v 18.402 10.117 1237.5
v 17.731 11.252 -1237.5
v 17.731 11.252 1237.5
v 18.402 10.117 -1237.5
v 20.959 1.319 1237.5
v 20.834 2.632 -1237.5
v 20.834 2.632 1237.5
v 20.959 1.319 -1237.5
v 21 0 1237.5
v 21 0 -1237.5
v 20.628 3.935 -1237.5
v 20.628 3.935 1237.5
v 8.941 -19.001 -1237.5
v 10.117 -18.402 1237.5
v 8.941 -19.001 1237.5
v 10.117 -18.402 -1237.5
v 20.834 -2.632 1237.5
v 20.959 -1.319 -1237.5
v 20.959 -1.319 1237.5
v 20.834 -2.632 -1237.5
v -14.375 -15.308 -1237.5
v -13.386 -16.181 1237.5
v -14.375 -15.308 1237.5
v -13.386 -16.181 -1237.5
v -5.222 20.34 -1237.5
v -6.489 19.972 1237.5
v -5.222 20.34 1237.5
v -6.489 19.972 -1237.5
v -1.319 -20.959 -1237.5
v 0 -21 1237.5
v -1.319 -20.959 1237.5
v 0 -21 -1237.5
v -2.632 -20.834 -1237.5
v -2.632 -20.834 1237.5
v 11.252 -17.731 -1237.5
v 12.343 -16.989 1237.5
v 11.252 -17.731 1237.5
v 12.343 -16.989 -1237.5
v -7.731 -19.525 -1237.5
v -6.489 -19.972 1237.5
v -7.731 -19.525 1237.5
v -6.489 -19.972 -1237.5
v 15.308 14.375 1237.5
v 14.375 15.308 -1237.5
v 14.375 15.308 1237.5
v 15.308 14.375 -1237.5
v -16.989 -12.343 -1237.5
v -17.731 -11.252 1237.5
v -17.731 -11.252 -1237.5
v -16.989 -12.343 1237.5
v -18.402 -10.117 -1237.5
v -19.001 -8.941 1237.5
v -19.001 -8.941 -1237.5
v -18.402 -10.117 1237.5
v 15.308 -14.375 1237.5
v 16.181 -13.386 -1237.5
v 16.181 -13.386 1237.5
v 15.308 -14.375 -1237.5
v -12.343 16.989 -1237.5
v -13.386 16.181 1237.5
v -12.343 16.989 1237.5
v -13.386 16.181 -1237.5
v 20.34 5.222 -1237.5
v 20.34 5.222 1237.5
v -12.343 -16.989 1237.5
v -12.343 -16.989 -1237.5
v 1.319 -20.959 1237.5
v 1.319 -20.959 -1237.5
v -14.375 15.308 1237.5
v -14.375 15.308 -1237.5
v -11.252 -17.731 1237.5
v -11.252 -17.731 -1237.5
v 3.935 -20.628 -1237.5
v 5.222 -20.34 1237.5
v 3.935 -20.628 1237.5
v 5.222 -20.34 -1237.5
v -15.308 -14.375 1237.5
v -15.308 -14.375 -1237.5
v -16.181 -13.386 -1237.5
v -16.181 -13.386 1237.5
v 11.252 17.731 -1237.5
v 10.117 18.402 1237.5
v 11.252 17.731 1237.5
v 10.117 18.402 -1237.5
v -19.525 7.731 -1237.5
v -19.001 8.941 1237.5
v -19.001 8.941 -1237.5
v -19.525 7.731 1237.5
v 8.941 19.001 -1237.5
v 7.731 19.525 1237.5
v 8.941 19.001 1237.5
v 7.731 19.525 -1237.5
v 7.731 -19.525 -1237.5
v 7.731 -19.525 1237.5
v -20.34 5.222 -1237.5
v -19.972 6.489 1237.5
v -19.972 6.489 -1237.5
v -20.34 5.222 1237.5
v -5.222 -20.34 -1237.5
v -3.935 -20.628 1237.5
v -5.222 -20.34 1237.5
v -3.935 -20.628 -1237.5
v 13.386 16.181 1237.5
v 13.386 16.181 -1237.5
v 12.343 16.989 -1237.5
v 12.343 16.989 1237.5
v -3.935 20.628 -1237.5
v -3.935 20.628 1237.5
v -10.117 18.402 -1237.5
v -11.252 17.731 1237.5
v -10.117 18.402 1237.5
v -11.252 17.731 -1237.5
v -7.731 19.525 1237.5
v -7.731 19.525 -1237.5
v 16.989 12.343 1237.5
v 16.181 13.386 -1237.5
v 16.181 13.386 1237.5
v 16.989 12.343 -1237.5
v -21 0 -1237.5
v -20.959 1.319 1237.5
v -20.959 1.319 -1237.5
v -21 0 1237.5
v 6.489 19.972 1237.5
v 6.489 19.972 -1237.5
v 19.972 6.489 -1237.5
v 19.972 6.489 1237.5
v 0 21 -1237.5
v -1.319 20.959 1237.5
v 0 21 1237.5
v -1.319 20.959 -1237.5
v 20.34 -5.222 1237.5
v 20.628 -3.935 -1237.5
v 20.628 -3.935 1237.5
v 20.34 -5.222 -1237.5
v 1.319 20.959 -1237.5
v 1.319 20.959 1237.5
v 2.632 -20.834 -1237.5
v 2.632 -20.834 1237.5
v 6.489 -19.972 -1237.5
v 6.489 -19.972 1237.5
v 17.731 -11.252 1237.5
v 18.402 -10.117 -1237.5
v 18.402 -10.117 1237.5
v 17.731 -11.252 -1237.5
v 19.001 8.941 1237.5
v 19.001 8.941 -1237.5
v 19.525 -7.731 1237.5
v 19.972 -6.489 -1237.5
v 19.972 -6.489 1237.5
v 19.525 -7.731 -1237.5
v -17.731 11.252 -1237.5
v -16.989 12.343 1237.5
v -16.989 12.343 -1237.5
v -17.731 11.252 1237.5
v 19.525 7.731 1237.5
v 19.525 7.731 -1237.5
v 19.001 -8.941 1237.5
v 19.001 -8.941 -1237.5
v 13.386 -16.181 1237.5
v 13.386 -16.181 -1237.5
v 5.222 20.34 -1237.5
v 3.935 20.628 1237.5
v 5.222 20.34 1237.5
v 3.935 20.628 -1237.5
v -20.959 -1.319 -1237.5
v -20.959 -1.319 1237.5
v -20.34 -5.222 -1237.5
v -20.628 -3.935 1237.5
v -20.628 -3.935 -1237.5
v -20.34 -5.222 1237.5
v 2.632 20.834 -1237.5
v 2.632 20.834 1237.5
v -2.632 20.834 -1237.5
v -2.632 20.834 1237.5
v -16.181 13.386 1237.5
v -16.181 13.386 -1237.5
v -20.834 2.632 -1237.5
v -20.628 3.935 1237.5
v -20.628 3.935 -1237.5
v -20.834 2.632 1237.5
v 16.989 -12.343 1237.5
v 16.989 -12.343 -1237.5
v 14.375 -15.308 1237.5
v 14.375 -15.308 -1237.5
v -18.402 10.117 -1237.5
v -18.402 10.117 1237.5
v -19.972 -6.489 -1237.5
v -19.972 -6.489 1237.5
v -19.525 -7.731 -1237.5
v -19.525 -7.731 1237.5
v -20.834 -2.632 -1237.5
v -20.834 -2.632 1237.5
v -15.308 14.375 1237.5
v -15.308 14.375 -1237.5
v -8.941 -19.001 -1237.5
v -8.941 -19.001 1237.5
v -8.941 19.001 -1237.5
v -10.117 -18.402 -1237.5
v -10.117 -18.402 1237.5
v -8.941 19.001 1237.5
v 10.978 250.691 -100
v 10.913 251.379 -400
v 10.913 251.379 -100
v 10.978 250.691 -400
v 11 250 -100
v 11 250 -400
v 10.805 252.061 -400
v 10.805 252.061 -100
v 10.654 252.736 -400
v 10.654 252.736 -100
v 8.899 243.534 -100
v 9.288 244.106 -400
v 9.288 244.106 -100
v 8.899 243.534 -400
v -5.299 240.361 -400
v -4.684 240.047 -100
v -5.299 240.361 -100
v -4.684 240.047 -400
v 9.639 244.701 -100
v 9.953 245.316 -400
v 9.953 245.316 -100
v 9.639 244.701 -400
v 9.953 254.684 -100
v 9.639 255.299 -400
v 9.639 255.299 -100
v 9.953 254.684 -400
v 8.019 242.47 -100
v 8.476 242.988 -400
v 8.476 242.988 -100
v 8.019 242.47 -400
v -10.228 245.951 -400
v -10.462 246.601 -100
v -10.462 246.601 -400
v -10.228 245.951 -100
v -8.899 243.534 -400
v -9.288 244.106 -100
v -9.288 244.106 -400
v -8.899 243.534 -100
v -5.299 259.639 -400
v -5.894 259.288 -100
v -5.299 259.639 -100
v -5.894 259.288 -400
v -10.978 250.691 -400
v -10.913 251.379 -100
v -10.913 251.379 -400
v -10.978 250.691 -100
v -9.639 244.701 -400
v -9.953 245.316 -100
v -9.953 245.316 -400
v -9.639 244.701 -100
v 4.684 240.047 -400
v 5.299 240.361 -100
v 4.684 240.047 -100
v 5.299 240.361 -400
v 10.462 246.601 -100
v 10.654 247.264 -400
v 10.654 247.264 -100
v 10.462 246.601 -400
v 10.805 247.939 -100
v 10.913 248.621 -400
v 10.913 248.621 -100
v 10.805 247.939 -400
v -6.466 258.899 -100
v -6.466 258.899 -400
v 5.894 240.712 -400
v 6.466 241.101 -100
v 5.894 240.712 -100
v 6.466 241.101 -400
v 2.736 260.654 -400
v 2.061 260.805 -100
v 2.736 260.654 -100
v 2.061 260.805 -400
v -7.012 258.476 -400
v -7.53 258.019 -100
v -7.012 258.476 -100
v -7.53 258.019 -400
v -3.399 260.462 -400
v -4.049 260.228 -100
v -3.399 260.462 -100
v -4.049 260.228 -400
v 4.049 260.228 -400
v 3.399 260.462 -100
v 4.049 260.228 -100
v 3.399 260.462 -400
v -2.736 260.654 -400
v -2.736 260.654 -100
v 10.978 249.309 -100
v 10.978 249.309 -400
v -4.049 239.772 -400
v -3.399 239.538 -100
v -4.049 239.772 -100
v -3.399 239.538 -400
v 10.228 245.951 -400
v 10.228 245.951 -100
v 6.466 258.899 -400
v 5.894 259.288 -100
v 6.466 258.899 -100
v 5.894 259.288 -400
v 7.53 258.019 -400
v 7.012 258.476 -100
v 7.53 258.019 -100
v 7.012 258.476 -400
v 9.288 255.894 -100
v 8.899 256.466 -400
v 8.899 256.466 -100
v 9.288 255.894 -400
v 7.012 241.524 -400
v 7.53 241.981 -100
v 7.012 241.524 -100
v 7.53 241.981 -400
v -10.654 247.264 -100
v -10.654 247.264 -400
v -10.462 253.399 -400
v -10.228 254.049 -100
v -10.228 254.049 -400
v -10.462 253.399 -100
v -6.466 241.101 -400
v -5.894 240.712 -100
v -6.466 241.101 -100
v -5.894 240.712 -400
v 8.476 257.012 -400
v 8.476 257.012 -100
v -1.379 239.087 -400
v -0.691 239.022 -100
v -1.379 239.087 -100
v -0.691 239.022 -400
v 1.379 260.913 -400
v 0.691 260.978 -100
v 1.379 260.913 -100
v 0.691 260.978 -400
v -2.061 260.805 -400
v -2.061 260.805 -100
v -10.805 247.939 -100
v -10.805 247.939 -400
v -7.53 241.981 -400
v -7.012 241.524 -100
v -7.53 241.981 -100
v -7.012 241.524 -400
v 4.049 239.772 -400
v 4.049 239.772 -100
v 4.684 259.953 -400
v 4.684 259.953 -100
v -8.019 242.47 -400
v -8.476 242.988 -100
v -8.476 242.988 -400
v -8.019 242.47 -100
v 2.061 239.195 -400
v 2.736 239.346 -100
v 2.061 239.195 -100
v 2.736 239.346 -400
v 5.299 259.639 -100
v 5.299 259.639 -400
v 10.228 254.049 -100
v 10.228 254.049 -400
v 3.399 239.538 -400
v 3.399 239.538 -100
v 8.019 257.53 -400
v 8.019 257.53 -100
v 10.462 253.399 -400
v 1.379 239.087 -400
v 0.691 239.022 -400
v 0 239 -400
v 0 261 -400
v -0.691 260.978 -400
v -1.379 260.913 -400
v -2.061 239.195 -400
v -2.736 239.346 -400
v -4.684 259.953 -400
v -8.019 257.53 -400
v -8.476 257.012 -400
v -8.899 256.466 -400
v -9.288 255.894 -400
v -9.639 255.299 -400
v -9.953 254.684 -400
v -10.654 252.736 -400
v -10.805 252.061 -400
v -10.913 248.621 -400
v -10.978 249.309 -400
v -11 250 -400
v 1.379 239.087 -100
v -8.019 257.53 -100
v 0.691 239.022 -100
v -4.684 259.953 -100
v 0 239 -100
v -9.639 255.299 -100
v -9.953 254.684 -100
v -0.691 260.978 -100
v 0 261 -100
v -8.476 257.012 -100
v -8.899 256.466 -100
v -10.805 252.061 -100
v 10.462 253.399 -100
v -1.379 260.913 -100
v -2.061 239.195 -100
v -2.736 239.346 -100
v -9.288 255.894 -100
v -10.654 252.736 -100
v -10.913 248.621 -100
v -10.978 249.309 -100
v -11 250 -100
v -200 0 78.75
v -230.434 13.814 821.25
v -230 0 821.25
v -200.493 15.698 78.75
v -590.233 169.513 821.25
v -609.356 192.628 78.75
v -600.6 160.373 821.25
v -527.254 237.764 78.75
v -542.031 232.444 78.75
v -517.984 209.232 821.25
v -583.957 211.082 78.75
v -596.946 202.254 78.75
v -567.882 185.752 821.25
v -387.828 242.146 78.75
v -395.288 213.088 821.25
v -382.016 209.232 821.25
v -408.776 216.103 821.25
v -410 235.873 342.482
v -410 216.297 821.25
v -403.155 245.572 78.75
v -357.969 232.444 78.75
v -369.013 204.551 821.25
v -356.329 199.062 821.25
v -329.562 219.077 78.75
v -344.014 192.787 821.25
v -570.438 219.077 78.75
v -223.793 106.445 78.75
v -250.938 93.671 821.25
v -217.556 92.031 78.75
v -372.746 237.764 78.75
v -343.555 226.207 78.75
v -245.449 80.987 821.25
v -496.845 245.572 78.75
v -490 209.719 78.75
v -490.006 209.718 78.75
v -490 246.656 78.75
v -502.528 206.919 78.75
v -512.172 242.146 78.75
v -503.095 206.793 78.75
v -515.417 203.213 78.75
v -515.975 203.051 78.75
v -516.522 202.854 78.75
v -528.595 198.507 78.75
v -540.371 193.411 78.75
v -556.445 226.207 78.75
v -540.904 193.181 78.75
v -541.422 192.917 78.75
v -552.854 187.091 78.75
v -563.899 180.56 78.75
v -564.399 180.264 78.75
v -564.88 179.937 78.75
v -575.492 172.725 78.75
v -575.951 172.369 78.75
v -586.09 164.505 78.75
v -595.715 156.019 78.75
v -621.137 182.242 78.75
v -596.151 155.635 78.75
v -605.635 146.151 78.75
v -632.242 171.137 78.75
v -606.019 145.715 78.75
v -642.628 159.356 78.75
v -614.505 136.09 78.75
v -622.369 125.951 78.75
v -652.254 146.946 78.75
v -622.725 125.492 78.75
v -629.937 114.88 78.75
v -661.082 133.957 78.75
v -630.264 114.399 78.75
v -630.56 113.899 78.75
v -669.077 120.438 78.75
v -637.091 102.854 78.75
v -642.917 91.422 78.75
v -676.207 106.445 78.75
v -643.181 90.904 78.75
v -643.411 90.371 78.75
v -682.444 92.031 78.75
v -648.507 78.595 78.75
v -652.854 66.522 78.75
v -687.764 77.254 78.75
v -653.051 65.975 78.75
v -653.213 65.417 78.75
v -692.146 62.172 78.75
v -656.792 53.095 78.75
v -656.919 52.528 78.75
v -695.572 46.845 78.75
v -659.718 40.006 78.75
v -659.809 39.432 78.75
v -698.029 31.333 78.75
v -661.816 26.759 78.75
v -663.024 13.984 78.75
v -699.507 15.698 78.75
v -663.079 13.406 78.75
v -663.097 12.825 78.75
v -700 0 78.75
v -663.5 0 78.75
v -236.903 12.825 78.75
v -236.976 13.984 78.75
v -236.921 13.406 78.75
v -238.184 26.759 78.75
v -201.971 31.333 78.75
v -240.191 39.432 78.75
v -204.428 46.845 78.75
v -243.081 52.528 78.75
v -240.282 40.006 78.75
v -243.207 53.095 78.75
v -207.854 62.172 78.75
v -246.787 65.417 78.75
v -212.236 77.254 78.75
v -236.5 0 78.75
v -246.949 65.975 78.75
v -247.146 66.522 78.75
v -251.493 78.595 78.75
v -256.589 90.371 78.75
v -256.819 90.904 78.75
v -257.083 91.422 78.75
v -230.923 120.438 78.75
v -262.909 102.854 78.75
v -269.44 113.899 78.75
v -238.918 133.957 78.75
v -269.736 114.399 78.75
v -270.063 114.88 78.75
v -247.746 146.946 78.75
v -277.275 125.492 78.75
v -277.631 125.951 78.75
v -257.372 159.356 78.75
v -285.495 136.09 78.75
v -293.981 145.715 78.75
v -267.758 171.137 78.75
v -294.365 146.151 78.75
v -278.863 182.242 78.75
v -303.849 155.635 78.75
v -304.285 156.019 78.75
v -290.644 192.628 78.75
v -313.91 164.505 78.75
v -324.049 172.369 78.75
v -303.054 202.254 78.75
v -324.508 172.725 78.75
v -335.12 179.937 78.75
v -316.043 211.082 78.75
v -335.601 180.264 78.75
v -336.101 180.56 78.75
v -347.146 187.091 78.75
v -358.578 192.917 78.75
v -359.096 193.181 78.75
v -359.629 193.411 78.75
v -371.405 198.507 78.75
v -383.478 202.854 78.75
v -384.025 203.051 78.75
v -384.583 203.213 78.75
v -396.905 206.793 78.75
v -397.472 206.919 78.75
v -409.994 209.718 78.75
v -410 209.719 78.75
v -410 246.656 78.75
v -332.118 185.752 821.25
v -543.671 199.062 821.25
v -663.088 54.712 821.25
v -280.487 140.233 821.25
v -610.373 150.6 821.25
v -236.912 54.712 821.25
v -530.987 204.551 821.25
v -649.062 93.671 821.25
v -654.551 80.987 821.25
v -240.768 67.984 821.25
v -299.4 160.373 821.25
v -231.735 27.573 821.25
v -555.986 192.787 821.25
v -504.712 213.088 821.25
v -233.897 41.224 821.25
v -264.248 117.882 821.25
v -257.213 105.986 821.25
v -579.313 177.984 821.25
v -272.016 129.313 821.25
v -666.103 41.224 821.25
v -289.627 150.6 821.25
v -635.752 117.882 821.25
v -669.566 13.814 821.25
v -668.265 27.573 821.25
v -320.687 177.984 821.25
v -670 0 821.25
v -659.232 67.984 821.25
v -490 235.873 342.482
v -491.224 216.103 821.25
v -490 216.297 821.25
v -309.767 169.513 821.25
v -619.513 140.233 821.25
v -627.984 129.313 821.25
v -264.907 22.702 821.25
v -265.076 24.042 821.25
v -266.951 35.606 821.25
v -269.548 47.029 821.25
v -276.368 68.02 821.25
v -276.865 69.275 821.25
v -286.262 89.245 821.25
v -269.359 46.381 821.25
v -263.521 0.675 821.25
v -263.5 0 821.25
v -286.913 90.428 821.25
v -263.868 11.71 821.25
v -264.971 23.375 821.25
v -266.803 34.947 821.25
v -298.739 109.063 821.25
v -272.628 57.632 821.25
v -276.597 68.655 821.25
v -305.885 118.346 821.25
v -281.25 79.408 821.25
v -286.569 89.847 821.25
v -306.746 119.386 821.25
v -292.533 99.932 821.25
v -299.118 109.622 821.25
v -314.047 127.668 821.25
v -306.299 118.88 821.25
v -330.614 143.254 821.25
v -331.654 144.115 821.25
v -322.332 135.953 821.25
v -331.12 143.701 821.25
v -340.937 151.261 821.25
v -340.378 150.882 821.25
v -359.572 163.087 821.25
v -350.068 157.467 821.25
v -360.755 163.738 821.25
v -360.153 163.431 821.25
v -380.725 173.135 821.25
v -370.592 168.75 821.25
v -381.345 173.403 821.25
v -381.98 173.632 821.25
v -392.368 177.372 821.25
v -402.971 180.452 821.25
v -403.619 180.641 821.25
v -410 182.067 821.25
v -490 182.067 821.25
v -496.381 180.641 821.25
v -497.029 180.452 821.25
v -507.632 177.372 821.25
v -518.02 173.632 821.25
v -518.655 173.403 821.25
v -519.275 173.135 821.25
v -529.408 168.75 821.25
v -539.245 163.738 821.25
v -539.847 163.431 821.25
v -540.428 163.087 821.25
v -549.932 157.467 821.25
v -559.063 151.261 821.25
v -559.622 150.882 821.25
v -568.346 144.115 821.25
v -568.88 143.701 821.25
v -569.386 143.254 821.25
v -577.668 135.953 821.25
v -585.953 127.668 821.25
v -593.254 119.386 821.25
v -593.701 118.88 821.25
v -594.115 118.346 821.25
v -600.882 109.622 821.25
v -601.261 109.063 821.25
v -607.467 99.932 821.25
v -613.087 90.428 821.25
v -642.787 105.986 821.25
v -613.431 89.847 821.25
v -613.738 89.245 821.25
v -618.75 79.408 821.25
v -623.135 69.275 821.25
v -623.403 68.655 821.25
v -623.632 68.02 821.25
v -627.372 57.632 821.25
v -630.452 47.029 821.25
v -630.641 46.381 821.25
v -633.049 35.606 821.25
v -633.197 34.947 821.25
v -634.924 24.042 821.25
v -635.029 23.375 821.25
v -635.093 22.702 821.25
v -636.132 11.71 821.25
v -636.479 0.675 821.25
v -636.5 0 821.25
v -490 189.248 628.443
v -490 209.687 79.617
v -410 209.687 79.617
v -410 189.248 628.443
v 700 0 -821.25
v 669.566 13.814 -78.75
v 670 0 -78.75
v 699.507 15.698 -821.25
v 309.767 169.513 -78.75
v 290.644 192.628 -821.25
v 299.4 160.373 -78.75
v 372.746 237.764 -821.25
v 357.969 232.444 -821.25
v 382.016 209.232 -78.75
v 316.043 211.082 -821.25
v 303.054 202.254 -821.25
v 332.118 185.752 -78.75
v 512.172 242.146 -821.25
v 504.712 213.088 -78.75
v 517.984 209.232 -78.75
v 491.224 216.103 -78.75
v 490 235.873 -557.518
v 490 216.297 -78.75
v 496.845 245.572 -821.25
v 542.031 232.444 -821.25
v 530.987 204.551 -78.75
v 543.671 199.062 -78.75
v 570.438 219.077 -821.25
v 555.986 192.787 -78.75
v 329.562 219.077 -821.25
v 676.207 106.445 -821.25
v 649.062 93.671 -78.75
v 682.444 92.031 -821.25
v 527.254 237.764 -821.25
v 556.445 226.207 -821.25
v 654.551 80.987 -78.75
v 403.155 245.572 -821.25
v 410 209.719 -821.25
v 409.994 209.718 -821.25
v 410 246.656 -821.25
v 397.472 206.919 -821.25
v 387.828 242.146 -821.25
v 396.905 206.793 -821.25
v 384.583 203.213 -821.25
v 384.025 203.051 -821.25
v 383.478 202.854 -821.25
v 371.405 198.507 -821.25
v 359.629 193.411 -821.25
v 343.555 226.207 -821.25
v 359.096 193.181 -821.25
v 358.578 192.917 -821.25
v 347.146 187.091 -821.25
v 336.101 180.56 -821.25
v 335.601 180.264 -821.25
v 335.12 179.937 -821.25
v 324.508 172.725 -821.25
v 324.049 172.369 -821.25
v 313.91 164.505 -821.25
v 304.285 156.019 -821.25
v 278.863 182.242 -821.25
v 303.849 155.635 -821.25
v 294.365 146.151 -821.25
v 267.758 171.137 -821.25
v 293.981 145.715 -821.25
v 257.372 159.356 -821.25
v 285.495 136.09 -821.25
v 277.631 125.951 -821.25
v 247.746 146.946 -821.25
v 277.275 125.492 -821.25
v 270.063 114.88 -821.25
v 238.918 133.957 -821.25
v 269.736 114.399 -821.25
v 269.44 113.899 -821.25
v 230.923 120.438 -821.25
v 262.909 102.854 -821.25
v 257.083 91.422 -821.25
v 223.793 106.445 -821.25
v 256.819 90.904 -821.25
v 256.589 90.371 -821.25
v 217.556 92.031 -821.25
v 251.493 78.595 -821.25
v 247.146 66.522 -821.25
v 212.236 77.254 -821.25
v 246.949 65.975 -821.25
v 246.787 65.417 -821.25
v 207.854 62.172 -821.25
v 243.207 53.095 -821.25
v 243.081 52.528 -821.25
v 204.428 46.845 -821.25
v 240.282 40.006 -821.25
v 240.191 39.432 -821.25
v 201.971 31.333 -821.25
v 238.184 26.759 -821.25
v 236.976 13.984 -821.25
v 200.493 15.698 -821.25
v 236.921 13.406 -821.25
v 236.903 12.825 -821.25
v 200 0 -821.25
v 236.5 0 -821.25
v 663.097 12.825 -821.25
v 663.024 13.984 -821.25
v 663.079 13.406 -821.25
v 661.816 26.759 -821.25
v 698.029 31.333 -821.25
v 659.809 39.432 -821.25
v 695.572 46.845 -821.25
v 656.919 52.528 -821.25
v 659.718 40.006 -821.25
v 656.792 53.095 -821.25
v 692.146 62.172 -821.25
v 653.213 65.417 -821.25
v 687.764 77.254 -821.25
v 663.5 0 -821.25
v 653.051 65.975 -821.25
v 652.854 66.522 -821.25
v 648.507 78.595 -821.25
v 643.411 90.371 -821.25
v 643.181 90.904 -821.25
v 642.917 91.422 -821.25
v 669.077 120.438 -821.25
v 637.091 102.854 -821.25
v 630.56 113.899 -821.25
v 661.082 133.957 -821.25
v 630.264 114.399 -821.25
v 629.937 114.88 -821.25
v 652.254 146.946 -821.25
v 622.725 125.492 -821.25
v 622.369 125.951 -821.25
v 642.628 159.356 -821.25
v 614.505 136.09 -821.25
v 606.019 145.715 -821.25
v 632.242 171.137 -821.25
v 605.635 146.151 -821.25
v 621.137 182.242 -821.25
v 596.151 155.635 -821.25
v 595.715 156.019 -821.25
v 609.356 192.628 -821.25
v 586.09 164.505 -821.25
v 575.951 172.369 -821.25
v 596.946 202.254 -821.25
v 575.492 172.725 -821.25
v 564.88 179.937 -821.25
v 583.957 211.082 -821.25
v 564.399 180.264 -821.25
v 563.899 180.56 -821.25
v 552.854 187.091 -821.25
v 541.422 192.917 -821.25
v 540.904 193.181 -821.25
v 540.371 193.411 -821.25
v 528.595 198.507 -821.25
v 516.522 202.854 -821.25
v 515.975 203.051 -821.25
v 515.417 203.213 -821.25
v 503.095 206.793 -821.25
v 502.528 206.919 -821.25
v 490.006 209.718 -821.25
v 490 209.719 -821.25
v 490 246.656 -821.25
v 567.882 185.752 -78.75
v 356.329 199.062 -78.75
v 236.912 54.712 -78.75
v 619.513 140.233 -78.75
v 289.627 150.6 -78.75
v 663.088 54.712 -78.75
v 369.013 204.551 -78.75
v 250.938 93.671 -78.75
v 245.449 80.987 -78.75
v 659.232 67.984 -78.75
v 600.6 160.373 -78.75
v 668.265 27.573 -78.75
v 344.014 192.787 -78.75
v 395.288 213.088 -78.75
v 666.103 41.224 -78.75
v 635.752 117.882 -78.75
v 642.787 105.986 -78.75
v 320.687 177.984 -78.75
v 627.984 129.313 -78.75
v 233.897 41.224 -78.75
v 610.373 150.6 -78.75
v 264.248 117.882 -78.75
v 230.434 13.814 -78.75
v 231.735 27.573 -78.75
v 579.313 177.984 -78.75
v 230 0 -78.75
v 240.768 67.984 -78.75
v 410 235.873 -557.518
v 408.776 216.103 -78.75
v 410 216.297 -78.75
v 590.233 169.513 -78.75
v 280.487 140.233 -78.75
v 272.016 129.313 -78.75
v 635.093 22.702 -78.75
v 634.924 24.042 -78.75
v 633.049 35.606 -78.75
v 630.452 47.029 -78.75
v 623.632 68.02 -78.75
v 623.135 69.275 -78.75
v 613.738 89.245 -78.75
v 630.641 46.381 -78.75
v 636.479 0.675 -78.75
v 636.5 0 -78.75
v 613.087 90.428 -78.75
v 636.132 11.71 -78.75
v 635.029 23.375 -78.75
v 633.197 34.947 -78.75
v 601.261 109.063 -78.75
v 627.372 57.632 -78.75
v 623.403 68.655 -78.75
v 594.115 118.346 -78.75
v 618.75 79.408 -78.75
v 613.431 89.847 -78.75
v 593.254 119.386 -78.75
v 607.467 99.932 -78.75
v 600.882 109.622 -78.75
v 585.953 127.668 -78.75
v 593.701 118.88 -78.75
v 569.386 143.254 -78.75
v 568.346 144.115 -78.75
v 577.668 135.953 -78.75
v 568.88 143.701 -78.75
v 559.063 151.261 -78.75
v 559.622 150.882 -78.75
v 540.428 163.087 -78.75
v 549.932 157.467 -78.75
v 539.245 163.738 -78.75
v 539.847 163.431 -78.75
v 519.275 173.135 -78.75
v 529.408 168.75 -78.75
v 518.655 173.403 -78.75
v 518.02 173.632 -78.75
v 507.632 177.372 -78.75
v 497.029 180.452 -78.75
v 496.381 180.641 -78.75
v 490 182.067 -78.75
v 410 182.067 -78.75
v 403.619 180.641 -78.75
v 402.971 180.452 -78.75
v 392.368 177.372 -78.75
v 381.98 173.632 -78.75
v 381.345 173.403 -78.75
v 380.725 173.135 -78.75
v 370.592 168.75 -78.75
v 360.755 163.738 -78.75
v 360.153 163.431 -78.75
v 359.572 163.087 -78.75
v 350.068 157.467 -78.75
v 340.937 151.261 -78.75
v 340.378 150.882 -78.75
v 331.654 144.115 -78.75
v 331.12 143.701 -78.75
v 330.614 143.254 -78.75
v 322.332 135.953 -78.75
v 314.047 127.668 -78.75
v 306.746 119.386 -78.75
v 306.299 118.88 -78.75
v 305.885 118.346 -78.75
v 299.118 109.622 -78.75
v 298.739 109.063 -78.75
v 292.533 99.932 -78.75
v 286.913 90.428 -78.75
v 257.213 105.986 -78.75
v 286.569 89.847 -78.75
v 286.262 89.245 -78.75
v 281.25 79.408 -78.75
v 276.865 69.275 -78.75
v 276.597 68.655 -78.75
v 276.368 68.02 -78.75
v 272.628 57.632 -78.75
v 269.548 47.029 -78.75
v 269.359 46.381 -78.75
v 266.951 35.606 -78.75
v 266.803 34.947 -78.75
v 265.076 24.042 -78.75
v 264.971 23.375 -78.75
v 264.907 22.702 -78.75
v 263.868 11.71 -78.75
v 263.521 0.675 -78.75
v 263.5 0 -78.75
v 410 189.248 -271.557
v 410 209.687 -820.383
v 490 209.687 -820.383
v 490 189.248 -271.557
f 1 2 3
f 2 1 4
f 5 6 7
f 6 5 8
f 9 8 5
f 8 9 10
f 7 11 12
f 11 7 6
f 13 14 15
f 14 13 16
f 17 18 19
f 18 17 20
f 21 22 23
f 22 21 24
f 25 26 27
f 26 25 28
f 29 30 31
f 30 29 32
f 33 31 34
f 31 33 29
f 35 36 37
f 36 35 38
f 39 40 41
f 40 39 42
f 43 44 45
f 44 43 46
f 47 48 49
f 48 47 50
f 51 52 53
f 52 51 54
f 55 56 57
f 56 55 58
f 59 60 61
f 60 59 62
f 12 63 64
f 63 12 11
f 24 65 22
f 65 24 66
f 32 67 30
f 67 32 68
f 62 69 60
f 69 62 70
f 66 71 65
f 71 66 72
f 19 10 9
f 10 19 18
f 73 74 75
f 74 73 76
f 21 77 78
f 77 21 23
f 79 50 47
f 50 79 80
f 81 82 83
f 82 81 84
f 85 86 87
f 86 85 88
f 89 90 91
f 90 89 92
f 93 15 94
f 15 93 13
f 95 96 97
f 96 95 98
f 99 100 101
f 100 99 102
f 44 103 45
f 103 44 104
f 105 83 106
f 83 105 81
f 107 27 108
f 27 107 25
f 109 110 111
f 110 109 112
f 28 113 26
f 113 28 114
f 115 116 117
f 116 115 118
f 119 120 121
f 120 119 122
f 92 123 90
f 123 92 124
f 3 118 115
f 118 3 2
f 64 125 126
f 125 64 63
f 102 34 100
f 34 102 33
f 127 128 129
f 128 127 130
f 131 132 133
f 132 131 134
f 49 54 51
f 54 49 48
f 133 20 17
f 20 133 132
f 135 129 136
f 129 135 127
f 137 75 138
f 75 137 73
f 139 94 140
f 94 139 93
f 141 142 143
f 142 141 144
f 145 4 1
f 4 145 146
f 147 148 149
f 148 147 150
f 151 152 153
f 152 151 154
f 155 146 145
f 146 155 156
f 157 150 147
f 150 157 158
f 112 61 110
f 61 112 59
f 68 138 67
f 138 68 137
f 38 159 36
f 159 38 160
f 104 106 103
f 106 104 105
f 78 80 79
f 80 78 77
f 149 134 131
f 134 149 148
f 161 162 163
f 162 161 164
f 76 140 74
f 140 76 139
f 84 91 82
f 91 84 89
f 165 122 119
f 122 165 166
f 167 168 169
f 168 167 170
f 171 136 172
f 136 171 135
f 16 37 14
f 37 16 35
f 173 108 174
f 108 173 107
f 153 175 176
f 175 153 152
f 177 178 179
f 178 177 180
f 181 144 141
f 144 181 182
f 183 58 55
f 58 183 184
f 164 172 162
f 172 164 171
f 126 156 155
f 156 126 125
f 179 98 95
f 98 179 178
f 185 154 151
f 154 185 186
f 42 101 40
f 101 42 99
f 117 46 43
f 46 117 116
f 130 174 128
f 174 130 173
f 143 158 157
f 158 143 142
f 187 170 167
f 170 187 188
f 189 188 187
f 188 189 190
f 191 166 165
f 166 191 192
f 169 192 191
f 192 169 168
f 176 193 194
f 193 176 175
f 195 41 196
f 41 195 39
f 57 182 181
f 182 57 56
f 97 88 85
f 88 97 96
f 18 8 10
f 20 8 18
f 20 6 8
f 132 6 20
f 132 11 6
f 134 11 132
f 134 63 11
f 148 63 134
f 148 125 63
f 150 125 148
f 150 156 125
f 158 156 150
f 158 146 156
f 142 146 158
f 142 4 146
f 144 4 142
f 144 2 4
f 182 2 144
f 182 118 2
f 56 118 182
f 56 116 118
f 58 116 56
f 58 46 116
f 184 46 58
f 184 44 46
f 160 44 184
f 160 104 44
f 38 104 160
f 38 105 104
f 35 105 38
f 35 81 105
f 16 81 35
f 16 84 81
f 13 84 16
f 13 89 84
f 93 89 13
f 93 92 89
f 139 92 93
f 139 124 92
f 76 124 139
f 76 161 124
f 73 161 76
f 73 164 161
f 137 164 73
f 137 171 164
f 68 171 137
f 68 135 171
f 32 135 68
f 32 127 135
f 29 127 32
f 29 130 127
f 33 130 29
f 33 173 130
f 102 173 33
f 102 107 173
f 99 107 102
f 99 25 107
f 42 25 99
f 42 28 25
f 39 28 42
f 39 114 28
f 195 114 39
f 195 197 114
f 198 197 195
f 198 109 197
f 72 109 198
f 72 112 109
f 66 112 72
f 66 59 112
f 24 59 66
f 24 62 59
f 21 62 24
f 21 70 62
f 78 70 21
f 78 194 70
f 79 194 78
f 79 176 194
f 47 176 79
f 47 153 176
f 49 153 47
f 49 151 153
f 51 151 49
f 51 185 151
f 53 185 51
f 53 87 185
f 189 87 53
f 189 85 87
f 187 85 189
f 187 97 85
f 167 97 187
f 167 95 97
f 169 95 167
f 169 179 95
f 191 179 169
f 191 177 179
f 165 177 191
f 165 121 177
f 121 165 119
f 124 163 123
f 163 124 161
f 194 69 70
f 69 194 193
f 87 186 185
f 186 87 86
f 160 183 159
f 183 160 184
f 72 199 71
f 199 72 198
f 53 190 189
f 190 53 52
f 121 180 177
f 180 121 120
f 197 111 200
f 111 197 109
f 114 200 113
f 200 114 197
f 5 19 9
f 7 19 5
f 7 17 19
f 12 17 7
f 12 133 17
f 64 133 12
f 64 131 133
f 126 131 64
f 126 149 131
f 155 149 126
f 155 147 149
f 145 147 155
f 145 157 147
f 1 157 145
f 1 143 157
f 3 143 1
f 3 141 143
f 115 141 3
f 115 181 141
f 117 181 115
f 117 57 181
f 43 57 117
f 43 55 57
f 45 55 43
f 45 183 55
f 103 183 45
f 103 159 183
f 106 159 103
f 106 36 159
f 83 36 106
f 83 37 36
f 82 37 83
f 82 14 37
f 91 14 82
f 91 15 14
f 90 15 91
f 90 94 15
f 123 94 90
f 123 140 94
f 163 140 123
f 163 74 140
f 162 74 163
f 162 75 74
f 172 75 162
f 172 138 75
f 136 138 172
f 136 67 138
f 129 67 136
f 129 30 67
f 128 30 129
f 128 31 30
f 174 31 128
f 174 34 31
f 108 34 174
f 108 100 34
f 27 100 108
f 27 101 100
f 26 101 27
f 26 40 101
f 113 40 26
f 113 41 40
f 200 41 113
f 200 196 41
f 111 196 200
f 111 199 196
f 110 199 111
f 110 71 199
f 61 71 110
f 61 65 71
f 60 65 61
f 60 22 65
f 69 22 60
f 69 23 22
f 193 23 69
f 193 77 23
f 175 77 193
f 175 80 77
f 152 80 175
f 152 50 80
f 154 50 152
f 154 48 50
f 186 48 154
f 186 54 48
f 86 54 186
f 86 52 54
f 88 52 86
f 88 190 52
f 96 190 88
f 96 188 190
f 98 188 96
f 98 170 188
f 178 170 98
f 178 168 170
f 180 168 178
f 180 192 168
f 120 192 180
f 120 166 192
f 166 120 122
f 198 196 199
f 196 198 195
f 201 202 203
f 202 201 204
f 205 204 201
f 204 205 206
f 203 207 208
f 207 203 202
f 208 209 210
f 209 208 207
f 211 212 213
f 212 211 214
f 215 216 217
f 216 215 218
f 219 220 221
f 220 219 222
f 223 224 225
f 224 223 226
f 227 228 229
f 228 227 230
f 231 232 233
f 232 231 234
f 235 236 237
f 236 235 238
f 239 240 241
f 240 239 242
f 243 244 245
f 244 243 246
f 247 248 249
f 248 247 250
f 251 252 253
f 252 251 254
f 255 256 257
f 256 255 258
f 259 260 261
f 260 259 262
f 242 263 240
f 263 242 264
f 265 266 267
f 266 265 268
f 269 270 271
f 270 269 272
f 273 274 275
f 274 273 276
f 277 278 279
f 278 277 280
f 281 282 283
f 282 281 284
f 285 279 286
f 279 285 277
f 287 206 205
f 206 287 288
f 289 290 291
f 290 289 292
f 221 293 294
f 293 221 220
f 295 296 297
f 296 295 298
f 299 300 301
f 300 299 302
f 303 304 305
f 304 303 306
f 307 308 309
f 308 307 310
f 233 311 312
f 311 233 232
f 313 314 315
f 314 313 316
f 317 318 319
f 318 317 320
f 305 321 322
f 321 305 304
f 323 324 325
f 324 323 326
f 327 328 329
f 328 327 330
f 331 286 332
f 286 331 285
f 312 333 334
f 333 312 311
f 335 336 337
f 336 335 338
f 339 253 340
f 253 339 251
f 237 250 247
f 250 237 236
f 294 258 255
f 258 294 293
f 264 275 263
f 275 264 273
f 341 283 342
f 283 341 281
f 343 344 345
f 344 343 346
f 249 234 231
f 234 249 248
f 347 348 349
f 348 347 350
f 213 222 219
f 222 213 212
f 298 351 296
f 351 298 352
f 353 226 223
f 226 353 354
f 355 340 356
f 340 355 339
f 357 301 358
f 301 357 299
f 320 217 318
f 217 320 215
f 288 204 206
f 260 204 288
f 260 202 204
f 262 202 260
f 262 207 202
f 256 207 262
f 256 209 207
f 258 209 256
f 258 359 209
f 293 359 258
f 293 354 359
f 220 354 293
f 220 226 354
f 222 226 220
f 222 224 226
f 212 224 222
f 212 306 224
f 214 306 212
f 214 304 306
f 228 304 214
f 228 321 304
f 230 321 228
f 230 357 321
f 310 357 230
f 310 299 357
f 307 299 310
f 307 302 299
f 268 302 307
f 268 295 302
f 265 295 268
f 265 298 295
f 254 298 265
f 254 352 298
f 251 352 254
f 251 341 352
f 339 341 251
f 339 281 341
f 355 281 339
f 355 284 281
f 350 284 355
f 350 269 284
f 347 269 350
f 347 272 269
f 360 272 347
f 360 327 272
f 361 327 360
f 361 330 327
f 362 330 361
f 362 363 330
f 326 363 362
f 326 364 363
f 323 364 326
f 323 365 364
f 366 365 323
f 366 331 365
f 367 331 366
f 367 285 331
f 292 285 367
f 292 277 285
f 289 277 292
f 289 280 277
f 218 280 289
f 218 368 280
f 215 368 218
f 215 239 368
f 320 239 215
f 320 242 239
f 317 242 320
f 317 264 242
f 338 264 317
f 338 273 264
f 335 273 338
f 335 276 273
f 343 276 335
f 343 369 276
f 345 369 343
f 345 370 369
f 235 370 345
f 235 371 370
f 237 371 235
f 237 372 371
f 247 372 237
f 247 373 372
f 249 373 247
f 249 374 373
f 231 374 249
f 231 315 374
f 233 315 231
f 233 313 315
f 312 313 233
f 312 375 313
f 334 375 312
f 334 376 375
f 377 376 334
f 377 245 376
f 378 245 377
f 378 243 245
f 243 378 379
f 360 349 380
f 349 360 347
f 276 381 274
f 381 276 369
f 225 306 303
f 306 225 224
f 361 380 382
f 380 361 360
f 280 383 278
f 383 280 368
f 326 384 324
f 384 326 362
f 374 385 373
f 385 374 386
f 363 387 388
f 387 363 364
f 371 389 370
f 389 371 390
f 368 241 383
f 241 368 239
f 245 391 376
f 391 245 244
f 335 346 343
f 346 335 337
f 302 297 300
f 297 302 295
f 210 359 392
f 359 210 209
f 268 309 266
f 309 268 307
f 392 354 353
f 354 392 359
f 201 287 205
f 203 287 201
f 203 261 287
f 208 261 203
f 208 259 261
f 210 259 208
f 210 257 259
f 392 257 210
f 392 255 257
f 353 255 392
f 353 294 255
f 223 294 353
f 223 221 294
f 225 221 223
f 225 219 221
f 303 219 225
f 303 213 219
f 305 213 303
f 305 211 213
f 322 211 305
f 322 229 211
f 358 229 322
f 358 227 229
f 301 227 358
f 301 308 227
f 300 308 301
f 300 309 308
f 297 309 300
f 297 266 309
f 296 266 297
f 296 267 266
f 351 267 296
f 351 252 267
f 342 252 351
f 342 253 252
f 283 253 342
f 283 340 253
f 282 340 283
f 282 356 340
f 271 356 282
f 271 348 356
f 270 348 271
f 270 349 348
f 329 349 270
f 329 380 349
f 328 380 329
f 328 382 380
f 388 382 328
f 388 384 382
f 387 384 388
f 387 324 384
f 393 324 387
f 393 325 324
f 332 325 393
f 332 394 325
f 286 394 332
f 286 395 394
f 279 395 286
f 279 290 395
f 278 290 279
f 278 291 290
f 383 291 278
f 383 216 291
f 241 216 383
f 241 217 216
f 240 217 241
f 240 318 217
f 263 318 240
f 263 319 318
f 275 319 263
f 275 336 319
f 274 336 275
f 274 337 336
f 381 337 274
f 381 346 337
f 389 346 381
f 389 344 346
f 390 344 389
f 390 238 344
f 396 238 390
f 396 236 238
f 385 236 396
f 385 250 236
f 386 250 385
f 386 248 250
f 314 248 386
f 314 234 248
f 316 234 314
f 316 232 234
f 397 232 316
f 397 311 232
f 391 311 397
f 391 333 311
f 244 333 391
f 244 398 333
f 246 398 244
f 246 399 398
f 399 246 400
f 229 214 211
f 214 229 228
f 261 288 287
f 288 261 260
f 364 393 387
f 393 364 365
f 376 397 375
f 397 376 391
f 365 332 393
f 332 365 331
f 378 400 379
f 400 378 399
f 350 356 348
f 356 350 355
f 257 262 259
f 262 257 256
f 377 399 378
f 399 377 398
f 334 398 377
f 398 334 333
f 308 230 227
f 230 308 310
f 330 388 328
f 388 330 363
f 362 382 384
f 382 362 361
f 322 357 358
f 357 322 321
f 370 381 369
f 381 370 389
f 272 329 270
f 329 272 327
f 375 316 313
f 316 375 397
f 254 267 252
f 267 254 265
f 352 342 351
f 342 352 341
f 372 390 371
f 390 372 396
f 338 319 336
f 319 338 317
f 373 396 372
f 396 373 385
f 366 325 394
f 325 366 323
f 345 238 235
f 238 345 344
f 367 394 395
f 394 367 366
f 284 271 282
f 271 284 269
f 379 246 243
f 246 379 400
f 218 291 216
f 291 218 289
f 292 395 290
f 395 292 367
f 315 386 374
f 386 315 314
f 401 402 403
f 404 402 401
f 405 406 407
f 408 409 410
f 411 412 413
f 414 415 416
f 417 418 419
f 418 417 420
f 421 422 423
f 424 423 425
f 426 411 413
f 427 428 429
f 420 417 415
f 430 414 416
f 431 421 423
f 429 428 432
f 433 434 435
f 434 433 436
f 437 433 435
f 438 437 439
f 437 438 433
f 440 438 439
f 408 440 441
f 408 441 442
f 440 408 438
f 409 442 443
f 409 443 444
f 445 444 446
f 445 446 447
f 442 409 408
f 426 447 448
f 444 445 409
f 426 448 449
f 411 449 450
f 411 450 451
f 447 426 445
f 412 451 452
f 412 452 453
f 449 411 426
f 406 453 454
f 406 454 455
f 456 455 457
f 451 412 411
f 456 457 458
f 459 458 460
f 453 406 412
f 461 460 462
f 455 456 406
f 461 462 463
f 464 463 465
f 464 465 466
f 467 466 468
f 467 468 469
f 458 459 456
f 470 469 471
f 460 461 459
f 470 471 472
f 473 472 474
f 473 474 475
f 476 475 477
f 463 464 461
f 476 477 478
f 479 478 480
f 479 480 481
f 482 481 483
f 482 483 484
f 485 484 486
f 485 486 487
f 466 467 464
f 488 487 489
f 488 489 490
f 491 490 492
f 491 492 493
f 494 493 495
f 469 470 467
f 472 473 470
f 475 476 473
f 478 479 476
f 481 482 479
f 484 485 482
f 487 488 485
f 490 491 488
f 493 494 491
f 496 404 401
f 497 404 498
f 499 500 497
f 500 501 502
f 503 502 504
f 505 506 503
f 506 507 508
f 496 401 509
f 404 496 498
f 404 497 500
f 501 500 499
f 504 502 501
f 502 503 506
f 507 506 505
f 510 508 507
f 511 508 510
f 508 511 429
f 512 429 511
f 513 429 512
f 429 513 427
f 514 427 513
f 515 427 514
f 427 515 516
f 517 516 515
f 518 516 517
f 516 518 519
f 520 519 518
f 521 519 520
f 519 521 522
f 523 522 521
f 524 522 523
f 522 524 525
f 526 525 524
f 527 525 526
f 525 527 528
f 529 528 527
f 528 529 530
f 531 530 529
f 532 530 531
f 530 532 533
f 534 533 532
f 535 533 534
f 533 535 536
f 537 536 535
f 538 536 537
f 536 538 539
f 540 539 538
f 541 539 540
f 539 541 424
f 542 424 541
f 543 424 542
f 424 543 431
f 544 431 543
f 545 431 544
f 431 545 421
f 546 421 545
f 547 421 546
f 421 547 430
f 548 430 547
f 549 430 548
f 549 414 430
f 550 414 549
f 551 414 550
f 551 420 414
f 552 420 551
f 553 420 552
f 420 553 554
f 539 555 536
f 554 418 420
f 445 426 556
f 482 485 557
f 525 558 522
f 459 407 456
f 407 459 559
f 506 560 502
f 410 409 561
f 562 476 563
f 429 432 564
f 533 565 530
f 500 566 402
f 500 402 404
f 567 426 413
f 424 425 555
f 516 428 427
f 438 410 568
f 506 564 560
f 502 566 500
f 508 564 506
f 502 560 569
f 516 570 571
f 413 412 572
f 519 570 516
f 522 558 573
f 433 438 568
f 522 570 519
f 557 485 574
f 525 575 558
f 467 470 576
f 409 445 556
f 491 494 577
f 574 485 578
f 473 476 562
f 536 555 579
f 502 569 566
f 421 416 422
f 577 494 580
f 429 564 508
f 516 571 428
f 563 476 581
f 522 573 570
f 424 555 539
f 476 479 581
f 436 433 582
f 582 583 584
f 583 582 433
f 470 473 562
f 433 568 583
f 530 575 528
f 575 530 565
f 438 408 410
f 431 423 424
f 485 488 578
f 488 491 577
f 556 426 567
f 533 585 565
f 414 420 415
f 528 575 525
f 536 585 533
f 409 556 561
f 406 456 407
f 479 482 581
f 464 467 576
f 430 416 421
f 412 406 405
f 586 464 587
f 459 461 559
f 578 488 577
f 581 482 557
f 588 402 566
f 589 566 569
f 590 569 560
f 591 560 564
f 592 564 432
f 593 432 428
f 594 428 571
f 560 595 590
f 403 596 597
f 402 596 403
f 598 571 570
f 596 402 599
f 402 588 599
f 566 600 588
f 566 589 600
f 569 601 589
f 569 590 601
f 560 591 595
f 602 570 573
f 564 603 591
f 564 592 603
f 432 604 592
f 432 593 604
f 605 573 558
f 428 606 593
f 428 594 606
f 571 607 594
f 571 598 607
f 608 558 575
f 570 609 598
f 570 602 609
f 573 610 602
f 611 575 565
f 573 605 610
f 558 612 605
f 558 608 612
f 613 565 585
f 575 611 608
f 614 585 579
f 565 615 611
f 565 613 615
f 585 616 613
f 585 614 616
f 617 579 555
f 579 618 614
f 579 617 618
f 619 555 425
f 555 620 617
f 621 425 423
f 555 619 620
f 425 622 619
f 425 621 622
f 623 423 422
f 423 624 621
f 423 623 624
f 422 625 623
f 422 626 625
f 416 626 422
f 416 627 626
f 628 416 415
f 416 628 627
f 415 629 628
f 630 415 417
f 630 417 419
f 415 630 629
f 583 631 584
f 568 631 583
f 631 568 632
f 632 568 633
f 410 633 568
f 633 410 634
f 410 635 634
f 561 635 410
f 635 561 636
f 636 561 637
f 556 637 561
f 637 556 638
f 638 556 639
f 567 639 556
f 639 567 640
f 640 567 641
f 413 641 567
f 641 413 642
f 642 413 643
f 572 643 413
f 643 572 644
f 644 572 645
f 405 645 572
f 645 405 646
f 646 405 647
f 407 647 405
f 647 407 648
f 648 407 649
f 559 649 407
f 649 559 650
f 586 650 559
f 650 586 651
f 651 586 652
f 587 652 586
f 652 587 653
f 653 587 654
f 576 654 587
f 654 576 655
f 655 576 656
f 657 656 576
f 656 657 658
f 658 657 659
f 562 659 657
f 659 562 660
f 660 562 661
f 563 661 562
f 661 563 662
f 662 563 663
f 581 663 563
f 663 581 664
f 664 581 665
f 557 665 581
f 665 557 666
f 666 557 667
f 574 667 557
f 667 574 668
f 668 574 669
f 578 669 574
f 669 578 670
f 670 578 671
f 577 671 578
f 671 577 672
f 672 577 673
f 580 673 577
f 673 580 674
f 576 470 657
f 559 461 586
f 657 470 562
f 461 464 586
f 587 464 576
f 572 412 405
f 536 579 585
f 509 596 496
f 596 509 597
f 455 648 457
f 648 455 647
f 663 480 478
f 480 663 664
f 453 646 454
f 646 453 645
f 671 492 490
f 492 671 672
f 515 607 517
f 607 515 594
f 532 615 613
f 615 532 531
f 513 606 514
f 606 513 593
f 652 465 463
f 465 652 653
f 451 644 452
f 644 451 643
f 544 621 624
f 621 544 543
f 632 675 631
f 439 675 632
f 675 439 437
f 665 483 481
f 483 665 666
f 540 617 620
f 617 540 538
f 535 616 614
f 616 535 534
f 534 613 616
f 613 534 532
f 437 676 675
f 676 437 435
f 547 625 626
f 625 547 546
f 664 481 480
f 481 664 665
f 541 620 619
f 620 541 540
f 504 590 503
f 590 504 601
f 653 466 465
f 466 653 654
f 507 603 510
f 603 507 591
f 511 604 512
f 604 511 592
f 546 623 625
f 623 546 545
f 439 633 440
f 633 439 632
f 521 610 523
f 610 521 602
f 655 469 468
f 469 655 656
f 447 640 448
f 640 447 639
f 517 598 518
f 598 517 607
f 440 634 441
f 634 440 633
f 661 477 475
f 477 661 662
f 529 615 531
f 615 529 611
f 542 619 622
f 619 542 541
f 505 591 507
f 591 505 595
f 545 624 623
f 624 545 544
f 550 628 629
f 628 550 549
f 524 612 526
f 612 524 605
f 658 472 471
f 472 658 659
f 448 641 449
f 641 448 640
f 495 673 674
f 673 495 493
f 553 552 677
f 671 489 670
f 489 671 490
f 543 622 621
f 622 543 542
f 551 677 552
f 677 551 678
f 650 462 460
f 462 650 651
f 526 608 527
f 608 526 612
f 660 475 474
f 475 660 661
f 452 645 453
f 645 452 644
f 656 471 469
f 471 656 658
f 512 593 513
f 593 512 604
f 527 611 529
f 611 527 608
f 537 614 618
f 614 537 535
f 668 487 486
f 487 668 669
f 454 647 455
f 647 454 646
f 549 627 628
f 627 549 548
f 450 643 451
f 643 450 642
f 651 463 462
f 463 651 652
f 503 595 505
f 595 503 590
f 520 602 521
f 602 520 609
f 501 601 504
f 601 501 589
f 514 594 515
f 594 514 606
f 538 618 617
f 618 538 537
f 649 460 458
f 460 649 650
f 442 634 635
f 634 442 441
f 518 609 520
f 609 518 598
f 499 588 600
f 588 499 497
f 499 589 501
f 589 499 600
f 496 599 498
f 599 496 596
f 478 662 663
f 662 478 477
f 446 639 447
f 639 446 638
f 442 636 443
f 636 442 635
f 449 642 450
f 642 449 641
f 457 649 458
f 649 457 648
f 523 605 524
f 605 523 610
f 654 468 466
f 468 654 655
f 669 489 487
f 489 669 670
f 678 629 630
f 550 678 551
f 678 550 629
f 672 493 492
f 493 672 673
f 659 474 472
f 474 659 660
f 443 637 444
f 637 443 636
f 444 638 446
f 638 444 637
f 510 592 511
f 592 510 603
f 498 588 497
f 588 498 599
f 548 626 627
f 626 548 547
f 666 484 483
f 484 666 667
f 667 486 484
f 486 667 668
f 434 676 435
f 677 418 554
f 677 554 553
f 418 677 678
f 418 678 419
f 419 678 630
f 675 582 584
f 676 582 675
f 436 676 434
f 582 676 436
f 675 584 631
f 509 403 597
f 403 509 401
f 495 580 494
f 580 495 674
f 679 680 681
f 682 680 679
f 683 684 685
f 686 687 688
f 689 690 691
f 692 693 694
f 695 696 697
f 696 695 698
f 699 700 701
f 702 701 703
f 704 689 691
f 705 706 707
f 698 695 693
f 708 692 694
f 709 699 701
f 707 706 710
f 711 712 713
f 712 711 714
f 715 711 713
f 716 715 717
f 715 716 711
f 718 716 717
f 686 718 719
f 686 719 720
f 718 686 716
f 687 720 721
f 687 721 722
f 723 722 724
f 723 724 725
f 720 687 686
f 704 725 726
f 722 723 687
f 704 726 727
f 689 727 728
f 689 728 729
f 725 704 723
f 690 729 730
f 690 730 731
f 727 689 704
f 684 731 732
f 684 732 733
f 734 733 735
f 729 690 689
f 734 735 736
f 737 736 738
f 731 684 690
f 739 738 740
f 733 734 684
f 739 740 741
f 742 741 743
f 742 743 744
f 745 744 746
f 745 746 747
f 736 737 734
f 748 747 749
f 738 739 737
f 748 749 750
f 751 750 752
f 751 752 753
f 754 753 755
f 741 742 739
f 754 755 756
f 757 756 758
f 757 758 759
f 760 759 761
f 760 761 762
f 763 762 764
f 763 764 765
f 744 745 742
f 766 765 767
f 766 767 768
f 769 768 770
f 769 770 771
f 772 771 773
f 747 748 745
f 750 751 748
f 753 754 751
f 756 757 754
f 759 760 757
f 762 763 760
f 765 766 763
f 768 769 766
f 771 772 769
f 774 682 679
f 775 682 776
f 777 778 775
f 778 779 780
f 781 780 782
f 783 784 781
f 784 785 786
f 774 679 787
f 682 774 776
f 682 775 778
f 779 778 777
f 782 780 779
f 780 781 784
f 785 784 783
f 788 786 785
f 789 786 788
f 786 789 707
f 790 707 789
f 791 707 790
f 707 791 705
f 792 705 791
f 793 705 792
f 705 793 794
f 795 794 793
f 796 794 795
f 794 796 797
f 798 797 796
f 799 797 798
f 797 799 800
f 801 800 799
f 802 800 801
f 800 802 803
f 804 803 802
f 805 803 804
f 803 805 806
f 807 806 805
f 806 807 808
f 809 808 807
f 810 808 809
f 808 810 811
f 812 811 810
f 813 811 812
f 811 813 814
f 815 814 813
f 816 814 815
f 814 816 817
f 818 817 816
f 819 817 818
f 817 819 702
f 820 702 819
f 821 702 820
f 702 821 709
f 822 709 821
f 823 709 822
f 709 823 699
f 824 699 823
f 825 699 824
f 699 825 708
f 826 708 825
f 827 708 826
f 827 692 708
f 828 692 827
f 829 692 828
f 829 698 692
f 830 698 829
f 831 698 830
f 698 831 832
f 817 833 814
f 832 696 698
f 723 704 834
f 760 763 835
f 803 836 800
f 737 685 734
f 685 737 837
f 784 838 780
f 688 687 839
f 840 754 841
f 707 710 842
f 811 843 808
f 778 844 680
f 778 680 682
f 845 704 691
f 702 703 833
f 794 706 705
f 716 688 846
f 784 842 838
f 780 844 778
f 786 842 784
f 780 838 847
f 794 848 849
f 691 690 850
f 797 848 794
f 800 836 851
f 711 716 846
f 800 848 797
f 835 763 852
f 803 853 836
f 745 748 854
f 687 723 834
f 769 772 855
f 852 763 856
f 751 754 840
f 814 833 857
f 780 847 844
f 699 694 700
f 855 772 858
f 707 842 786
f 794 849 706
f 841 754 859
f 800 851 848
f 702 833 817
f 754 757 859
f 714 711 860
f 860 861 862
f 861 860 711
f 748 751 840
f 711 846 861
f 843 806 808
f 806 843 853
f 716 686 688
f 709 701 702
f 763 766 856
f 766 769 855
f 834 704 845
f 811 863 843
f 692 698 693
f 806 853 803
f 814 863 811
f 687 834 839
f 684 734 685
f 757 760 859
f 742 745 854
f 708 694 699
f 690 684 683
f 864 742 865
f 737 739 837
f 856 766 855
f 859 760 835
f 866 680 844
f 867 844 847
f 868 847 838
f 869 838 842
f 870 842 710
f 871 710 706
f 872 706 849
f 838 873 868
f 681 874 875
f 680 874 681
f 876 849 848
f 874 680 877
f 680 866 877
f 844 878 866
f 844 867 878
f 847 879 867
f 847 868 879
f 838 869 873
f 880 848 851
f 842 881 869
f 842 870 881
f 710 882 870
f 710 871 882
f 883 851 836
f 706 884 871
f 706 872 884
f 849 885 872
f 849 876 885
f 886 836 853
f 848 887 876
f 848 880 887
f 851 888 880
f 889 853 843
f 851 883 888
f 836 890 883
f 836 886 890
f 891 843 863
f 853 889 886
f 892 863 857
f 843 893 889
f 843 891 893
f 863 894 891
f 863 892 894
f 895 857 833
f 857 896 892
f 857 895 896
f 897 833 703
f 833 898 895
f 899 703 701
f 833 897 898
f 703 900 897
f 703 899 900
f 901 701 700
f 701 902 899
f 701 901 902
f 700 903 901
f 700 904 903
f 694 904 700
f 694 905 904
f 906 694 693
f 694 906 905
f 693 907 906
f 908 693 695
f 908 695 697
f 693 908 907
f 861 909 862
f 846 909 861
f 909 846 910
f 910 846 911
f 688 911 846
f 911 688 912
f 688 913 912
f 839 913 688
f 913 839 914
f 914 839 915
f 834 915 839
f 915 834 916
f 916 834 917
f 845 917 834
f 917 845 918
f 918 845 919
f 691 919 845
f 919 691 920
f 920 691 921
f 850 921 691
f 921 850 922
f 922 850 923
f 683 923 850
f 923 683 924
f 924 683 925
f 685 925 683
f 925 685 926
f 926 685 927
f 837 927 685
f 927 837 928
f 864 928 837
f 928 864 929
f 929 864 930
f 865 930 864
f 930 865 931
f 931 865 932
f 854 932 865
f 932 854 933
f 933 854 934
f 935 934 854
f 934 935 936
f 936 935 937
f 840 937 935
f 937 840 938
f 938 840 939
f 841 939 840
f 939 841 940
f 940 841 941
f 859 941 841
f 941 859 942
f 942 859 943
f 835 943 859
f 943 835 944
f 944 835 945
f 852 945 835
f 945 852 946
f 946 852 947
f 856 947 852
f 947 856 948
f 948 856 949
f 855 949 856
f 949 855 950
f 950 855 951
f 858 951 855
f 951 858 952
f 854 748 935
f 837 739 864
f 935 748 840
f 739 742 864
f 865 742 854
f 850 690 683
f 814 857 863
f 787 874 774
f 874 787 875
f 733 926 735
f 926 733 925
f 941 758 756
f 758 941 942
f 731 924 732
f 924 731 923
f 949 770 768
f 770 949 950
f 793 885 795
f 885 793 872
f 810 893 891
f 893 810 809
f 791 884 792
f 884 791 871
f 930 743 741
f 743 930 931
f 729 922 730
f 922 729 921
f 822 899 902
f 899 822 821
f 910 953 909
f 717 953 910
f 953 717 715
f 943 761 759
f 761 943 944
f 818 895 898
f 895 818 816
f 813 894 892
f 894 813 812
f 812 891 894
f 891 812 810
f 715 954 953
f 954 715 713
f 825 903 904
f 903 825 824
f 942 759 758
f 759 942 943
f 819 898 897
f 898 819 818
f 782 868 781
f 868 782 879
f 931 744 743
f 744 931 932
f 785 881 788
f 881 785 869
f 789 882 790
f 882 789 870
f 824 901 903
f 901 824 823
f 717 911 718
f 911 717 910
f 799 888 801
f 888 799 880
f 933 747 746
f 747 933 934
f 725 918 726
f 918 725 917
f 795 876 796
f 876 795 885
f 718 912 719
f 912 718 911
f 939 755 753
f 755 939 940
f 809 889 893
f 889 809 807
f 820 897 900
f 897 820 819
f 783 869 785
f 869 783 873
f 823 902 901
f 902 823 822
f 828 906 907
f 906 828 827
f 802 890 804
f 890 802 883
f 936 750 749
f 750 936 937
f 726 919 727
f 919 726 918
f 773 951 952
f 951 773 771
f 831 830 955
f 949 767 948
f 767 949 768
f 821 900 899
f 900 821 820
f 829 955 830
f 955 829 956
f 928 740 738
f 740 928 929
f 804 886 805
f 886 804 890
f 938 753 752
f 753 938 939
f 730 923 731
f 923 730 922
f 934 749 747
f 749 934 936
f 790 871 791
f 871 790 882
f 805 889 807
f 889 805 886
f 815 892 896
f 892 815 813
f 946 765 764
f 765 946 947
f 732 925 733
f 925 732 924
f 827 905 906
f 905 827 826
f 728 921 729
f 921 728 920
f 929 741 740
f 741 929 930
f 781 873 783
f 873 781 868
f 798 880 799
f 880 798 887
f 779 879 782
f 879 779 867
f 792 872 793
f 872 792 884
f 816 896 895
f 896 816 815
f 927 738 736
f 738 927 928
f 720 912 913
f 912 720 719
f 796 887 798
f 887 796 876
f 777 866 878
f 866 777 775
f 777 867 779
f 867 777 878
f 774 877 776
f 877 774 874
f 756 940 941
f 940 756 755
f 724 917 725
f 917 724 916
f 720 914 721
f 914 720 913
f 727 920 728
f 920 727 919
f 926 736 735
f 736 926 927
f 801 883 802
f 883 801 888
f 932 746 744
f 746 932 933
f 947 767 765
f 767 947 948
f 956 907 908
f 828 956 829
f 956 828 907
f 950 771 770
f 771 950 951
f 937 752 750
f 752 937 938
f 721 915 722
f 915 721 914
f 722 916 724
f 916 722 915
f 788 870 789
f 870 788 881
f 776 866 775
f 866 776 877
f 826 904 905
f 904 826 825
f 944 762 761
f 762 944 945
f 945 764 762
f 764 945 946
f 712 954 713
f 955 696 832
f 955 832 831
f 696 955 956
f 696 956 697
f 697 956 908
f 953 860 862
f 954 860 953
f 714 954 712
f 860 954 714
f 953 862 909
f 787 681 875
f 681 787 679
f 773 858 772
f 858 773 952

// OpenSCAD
// ============================================================================
// PROJECT: XXXG-00W0 WING GUNDAM ZERO EW - UPPER AIRFRAME EXTRACTIONS
// COMPONENT VAULT: BANDAI CAST RUNNER B - BICEP ARMOR SHELLS B17 & B18
// REBALANCING PARITY: UPPER LIMB WEIGHT TRACKING BEFORE GLOBAL LEG CALCULATIONS
// DESIGN PROTOCOL: WIRELESS INDUCTIVE HARNESS MATING HOUSINGS
// ============================================================================

$fn = 100; // Circular segment rendering resolution count

// Structural Constants Scaled 1:1 for a 16.7-Meter Airframe Scale (mm)
bicep_armor_length = 1650;              // Total vertical height of upper arm armor (mm)
bicep_outer_diameter = 440;             // Transverse shell casing envelope width (mm)
armor_skin_thickness = 35;              // Solid TiAl defensive protective wall (mm)
harness_conduit_width = 80;             // Cast-in 4oz copper logic trace track (mm)

module Runner_B_Bicep_Armor_Forge() {
    // Central Supply Injection Runner Axis (Molten Feed Line from Siphon Forge)
    color([0.22, 0.22, 0.24]) {
        cylinder(h = bicep_armor_length * 1.5, d = 42, center = true);
        // Direct injection gates tracking straight into the part mold cavities
        translate() rotate() cylinder(h = 300, d = 22);
        translate([0, 250, -400]) rotate() cylinder(h = 300, d = 22);
    }
    
    // Instantiate Scaled Skeutomorphic Part Molds Symmetrically
    Cast_Upper_Arm_Armor_Shells();
}

module Cast_Upper_Arm_Armor_Shells() {
    // ---- PART B17: LEFT BICEP EXTERIOR PROTECTION SHELL ---- [Page 6, Step 4]
    translate([-450, 0, 450]) color([0.85, 0.85, 0.9]) { // Classic White Armor Spec
        difference() {
            // Main cylindrical contoured upper arm protective panel
            cylinder(h = bicep_armor_length * 0.45, d1 = bicep_outer_diameter + 60, d2 = bicep_outer_diameter, center = true);
            
            // Internal pocket excavation (Leaves the rigid 35mm protective boundary)
            cylinder(h = bicep_armor_length * 0.5, d1 = bicep_outer_diameter + 60 - (armor_skin_thickness*2), d2 = bicep_outer_diameter - (armor_skin_thickness*2), center = true);
            
            // Continuous cast-in routing track for the 4oz solid-state wiring rails
            cube([harness_conduit_width, bicep_outer_diameter + 80, bicep_armor_length], center = true);
            
            // Slicing profile tool to generate an asymmetrical half-shell part component
            translate([0, -bicep_outer_diameter, 0])
                cube([bicep_outer_diameter * 2, bicep_outer_diameter * 2, bicep_armor_length * 2], center = true);
        }
    }
    
    // ---- PART B18: RIGHT BICEP EXTERIOR PROTECTION SHELL ---- [Page 6, Step 3]
    translate([450, 0, -450]) rotate() color([0.85, 0.85, 0.9]) {
        difference() {
            cylinder(h = bicep_armor_length * 0.45, d1 = bicep_outer_diameter + 60, d2 = bicep_outer_diameter, center = true);
            cylinder(h = bicep_armor_length * 0.5, d1 = bicep_outer_diameter + 60 - (armor_skin_thickness*2), d2 = bicep_outer_diameter - (armor_skin_thickness*2), center = true);
            cube([harness_conduit_width, bicep_outer_diameter + 80, bicep_armor_length], center = true);
            translate([0, -bicep_outer_diameter, 0])
                cube([bicep_outer_diameter * 2, bicep_outer_diameter * 2, bicep_armor_length * 2], center = true);
        }
    }
}

// Render Master Assembly to Parameter Workspace
Runner_B_Bicep_Armor_Forge();
